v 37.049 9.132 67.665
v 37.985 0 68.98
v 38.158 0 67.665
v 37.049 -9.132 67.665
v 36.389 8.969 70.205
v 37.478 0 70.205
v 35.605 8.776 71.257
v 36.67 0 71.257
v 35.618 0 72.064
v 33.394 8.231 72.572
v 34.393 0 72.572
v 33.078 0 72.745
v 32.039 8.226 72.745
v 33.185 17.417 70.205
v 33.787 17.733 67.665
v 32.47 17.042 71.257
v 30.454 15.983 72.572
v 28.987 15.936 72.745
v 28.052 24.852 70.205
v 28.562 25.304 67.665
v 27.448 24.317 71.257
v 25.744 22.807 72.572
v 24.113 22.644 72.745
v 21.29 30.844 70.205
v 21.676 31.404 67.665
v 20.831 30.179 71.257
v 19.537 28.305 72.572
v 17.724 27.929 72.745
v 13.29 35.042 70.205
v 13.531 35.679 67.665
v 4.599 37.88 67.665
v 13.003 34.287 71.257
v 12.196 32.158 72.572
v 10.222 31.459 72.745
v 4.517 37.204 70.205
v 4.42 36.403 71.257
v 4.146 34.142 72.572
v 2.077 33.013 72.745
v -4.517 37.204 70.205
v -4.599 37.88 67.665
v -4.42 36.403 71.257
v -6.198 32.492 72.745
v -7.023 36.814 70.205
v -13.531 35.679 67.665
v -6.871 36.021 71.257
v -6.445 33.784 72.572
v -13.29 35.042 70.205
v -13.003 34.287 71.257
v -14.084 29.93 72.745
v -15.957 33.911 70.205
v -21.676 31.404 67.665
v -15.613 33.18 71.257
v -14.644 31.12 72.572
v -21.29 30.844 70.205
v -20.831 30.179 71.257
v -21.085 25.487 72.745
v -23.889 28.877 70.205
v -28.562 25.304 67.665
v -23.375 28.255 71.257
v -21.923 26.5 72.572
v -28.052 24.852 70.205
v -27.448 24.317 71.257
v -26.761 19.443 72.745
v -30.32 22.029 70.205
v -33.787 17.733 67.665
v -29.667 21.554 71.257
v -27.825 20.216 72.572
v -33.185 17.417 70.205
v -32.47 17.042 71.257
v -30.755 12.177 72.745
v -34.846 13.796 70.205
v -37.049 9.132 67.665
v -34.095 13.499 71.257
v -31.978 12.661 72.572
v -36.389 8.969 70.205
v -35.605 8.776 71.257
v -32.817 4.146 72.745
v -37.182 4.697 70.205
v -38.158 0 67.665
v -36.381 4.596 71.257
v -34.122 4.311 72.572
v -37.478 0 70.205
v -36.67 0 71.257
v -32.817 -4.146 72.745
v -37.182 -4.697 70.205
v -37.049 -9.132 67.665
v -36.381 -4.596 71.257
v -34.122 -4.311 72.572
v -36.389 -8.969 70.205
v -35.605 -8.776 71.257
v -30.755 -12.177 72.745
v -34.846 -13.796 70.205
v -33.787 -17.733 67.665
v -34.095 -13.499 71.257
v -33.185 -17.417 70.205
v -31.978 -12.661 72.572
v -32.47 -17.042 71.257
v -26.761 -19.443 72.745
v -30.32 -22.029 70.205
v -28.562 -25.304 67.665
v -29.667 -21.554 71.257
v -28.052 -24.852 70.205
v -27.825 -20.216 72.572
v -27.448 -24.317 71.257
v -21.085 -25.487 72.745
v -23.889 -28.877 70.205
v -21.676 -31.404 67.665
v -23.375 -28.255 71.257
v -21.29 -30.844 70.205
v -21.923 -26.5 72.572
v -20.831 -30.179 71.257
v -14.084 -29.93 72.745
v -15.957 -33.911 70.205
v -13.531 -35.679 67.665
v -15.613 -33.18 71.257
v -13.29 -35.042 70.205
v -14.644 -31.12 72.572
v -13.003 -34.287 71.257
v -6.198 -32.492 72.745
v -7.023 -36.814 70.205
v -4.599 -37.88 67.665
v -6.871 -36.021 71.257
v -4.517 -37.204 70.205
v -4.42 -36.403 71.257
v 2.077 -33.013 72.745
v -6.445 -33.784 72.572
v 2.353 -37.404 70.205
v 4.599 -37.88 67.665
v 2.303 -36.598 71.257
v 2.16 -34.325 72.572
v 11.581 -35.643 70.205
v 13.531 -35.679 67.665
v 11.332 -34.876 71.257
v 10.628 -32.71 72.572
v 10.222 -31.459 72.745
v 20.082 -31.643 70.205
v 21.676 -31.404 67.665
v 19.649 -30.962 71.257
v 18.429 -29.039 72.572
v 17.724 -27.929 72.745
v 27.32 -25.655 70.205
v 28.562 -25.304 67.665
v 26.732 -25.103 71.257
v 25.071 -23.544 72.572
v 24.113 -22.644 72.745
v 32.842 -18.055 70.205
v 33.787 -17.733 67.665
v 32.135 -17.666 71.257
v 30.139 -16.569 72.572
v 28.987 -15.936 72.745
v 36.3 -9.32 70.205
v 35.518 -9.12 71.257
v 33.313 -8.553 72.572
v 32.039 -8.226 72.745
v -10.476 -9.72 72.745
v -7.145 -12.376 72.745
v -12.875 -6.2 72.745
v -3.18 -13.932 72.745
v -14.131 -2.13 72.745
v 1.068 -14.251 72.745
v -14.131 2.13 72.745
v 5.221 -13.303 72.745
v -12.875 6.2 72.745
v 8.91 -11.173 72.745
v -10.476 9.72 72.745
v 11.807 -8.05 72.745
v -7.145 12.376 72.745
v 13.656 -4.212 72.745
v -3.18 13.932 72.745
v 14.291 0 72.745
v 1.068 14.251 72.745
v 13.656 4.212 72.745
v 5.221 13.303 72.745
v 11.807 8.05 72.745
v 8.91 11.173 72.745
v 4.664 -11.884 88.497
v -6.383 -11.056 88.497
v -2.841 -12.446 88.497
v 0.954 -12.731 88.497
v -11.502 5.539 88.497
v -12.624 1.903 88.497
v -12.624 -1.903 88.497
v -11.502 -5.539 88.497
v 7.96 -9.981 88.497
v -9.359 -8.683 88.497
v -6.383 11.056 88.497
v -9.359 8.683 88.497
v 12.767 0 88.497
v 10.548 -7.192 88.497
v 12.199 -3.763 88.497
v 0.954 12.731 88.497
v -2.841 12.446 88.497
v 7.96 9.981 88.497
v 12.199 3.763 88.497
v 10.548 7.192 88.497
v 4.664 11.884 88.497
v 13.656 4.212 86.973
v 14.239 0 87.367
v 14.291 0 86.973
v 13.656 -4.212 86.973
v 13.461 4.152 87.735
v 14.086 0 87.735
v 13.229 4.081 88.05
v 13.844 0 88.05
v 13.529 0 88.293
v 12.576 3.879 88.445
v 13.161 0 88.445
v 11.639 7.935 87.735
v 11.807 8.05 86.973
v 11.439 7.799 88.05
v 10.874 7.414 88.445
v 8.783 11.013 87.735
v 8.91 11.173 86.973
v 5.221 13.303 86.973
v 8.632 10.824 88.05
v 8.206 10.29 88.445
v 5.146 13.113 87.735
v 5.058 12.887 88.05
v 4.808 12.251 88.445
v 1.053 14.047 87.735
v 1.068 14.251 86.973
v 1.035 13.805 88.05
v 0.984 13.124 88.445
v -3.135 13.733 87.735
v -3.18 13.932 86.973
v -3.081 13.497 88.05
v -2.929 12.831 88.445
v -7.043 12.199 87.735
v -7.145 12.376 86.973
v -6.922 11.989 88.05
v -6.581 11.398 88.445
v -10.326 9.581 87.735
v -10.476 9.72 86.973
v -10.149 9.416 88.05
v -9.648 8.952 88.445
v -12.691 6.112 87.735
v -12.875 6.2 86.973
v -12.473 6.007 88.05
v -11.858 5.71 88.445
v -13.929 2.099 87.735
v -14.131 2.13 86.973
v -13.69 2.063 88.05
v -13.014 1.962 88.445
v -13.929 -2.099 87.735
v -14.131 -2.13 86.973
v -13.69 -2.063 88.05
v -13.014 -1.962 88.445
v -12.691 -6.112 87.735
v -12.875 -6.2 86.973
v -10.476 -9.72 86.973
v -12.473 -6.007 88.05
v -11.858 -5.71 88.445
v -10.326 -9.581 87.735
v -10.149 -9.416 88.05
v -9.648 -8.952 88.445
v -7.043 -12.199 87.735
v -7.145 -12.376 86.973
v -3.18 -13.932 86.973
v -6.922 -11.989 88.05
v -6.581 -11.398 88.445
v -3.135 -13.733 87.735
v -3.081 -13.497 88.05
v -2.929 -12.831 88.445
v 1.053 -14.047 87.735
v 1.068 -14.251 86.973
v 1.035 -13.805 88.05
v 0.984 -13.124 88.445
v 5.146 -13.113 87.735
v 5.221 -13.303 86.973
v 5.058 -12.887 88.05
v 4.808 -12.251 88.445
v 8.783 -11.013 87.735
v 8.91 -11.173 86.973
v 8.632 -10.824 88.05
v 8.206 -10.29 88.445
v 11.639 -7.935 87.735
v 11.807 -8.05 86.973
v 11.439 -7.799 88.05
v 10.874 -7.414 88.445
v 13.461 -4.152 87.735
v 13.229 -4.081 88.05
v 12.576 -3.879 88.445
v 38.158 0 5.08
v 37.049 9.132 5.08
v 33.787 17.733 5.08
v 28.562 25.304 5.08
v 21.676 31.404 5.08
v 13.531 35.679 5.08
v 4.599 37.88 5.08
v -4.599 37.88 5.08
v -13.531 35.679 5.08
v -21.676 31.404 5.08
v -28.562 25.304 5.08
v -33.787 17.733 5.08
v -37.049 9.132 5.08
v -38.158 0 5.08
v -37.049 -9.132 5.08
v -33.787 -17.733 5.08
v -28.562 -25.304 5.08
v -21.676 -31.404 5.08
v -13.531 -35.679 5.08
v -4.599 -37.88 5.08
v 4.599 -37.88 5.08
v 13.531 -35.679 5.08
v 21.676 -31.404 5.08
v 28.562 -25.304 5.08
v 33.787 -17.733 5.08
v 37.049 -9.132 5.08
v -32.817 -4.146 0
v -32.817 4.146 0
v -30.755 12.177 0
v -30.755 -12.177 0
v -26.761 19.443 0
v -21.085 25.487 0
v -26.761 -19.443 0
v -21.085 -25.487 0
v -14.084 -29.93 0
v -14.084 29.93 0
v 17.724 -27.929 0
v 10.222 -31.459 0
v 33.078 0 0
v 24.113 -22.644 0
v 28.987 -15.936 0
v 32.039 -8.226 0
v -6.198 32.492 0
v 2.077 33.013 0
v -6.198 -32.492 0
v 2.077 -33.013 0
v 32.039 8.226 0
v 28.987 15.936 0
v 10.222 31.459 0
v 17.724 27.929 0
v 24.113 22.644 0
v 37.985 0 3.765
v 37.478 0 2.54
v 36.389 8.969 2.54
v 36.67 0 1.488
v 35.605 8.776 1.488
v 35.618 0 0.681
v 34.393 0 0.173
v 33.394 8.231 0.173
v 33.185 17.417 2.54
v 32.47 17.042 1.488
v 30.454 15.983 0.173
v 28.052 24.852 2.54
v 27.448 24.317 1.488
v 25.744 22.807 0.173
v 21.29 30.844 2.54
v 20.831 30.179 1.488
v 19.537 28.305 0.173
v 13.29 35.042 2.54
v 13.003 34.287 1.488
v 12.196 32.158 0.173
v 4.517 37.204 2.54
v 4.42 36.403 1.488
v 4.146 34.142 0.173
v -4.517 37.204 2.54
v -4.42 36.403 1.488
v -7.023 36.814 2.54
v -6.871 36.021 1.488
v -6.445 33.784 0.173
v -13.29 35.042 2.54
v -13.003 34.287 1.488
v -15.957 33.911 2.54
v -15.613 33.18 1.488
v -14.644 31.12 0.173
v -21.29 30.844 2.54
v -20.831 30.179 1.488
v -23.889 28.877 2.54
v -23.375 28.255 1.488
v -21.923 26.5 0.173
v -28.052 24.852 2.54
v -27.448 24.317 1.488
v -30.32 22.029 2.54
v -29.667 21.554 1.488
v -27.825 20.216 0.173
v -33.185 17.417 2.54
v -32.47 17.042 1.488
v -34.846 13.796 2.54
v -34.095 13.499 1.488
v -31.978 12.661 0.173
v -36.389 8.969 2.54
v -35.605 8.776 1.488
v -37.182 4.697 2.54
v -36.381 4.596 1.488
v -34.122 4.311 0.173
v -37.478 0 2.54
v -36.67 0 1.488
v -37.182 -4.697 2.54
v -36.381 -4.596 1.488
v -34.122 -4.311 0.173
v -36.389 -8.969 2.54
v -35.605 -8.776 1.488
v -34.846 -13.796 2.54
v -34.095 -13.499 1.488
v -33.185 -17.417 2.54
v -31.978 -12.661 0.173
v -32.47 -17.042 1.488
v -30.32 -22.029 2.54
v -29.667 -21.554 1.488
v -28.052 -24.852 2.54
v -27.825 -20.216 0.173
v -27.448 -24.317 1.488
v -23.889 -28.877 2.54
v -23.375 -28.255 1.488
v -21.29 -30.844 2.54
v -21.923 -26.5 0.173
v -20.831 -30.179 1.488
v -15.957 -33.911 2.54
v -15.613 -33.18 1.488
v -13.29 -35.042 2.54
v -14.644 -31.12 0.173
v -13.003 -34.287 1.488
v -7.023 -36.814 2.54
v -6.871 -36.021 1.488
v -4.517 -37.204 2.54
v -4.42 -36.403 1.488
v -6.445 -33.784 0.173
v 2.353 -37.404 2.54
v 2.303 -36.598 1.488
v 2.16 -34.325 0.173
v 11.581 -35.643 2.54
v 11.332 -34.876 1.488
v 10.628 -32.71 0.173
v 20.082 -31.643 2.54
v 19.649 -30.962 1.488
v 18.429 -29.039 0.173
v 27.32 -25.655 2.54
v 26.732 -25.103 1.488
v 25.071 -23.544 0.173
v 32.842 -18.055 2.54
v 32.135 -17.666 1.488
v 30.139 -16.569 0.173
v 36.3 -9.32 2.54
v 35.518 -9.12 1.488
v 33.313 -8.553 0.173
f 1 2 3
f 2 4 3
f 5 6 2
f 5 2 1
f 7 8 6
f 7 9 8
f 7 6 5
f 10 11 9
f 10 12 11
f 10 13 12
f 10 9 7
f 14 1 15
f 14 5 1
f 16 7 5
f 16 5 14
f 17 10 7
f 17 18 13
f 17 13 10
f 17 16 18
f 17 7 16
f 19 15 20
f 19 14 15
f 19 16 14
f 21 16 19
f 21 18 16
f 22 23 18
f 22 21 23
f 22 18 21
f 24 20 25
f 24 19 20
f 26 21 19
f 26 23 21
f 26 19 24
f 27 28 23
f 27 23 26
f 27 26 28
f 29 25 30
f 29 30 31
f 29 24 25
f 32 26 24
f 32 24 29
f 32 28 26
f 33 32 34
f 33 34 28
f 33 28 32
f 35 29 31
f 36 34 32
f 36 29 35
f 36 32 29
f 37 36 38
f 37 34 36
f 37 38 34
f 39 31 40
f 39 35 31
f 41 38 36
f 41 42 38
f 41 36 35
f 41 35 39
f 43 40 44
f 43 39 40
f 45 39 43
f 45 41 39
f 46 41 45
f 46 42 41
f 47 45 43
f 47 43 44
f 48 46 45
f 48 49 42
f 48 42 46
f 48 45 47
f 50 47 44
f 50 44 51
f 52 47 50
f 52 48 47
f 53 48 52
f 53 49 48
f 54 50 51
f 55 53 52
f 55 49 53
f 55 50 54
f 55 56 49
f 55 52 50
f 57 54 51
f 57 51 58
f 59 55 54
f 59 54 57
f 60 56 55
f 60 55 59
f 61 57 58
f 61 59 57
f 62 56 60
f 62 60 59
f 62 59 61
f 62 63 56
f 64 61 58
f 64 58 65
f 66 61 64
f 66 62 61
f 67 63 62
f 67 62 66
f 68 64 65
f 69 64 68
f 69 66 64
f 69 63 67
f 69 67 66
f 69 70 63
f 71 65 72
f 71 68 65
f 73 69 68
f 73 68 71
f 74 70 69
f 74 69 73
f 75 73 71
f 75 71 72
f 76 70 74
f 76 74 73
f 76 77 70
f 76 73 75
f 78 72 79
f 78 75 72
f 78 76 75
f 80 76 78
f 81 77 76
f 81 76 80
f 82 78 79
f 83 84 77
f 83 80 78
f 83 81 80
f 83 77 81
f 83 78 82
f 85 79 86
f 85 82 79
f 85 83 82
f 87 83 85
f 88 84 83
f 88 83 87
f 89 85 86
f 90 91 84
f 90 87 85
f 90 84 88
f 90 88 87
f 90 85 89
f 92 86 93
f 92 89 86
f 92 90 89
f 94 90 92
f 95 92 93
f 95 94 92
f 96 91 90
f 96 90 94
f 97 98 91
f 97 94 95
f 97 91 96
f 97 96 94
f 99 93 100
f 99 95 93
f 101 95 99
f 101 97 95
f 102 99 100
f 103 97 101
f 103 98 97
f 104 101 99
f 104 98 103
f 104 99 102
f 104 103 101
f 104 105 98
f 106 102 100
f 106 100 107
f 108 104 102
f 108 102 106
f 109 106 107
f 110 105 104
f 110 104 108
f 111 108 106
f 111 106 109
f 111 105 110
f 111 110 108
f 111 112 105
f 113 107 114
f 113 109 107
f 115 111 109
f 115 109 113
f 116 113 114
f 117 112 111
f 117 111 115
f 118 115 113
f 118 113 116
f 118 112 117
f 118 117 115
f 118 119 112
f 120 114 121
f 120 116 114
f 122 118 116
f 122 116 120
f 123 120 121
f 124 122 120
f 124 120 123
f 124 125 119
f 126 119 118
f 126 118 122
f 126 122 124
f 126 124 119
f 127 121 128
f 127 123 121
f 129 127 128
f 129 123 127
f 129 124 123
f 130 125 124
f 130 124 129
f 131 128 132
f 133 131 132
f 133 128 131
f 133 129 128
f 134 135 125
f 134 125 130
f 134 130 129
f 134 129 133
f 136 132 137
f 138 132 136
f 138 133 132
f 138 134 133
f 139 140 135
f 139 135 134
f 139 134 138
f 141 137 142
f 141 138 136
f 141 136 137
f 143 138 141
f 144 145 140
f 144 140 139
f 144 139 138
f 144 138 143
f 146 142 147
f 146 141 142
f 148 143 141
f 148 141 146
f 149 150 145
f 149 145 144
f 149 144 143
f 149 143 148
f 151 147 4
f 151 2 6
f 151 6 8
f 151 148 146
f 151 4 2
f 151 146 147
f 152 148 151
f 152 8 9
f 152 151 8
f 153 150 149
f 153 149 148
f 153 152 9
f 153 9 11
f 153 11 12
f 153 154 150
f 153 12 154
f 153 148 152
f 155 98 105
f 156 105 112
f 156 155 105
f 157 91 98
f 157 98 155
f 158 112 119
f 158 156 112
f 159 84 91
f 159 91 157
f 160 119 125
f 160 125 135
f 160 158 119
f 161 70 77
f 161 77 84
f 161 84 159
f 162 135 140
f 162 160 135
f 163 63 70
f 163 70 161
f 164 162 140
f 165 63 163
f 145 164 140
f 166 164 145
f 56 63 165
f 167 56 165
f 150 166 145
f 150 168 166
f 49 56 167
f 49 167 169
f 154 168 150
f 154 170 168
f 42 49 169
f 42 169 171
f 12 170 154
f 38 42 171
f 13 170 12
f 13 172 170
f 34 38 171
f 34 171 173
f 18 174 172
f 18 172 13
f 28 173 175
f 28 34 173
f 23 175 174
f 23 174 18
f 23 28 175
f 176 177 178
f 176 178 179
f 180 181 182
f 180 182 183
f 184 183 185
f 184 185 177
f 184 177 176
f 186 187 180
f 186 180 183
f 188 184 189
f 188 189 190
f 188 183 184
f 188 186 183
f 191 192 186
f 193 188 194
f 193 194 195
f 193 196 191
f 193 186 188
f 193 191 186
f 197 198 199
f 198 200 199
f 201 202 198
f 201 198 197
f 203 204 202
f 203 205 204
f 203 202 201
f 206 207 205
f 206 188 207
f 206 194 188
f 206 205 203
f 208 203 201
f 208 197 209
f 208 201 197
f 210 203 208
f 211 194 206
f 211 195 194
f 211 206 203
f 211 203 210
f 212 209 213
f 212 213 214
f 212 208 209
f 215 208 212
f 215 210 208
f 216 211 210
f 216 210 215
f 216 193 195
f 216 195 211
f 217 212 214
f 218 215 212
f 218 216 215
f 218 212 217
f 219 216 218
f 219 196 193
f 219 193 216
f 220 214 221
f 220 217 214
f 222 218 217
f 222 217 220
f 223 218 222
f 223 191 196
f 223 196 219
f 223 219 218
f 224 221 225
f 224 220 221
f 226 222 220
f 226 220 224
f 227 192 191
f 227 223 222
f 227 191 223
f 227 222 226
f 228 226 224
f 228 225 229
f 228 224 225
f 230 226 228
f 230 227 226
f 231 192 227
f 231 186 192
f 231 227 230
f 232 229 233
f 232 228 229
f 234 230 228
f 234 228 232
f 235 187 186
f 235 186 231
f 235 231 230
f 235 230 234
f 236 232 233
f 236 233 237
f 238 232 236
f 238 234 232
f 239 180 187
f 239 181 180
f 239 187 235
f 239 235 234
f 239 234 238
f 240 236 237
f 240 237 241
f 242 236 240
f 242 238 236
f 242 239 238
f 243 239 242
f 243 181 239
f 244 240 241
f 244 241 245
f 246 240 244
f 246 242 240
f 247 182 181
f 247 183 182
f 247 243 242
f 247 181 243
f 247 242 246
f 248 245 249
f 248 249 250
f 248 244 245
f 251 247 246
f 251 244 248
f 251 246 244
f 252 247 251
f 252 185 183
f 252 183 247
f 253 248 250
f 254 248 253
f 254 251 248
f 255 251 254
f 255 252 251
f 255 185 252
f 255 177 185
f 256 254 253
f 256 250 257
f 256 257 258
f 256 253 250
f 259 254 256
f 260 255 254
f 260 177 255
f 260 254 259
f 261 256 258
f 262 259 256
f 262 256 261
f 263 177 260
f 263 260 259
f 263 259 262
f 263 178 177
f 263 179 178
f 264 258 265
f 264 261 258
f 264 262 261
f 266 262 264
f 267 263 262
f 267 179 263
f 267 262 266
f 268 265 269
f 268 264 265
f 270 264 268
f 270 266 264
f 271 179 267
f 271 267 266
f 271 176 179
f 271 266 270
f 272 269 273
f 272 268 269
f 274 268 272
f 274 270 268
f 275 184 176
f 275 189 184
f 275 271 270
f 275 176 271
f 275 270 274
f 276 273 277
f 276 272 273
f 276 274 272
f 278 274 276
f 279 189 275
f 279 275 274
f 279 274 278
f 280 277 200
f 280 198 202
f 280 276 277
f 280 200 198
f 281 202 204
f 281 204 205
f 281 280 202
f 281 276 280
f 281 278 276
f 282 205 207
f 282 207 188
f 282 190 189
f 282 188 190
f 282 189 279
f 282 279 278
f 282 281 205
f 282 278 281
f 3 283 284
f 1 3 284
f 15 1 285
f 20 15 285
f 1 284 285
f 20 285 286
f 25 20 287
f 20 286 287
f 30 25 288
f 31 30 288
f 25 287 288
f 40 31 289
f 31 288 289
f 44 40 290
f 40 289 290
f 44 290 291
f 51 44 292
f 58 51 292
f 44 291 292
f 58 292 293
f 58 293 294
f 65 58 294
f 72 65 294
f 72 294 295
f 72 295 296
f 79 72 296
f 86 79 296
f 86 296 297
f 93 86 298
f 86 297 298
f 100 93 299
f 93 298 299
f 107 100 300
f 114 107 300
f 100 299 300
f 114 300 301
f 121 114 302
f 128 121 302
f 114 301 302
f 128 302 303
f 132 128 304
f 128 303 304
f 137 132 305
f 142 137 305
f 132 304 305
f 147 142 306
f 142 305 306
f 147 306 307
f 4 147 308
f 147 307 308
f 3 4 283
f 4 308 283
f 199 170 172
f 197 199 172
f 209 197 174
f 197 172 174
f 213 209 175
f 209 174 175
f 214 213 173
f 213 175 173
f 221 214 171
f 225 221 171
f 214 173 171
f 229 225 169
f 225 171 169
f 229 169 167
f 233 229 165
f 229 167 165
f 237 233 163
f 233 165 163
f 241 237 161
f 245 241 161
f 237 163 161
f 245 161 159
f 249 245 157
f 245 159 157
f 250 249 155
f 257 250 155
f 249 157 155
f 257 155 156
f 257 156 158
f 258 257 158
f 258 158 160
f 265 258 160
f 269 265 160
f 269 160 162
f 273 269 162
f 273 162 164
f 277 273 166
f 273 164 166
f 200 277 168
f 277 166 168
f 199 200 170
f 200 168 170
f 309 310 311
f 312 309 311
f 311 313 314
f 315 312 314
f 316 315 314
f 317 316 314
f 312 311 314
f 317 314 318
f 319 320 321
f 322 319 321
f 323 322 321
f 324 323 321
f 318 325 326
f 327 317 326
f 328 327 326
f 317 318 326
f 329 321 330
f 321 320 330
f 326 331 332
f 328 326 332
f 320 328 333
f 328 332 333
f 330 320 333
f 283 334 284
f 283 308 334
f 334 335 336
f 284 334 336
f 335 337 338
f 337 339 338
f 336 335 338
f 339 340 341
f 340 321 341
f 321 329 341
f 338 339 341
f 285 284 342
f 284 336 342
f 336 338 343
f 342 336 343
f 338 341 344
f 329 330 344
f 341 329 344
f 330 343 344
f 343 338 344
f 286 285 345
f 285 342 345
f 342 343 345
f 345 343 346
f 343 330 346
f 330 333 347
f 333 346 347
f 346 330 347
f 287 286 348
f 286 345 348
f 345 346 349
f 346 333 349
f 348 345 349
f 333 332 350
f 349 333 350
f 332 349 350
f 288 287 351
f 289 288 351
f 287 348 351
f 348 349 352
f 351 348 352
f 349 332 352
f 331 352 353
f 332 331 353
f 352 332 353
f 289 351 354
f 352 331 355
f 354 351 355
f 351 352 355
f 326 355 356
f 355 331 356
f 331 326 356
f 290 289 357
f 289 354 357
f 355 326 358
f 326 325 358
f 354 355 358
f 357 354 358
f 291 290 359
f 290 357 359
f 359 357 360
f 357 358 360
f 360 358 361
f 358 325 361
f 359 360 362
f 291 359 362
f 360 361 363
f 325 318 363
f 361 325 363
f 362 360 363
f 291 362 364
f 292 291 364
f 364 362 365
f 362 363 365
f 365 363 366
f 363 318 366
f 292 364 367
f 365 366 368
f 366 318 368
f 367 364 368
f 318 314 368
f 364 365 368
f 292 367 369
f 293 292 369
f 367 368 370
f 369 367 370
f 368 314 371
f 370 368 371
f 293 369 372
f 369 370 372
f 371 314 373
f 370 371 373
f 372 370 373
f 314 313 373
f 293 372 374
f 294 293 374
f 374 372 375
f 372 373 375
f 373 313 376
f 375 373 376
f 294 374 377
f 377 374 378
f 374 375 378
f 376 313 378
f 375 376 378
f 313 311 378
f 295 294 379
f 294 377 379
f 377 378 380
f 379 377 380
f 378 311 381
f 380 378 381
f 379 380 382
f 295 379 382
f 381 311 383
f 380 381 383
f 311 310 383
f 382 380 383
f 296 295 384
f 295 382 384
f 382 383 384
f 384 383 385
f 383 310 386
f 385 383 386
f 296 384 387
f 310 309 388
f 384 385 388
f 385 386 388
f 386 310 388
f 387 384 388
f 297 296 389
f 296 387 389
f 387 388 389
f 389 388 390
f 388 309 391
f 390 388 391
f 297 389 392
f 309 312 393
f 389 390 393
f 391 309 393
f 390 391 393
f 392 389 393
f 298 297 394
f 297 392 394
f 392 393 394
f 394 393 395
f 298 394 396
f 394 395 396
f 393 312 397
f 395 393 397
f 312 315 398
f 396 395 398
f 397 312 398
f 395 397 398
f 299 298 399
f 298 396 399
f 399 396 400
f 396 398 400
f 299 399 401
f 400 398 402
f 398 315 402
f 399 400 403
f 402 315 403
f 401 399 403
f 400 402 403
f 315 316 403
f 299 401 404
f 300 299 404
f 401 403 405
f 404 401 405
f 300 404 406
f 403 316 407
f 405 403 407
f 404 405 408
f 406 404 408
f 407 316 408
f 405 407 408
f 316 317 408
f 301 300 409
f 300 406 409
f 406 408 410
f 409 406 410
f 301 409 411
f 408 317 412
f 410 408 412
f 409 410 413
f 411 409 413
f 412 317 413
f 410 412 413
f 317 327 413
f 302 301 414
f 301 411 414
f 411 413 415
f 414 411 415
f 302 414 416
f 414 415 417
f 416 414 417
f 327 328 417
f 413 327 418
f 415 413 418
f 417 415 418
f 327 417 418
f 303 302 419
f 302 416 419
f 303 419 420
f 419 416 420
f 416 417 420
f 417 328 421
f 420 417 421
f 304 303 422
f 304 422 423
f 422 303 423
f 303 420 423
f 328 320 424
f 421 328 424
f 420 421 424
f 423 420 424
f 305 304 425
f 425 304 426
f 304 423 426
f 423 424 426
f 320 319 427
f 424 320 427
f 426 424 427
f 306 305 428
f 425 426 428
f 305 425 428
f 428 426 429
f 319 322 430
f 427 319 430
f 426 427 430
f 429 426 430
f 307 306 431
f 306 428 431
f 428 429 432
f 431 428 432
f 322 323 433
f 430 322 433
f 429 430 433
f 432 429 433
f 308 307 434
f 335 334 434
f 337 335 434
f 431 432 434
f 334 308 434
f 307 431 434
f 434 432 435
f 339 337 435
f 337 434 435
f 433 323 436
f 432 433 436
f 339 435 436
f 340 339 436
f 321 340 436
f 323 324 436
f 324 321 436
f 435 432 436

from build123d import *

# Parameters (mm, degrees)
F0_R     = 38.158283
F1_DEPTH = 72.74499
F2_R     = 5.08
F3_R     = 14.290577
F4_DEPTH = 15.7517
F5_R     = 1.524


with BuildPart() as f1:
    # F0 (on Top) → F1 (new body)
    with BuildSketch(Plane.XY):
        Circle(F0_R)
    extrude(amount=F1_DEPTH)

    # F2
    f2_edges = [f1.edges().sort_by_distance(p)[0] for p in [
        (-38.158283, 0, 72.74499),
        (-38.158283, 0, 0),
    ]]
    fillet(f2_edges, radius=F2_R)

    # F3 (on face) → F4 (join)
    with BuildSketch(Plane.XY.offset(72.74499)):
        Circle(F3_R)
    extrude(amount=F4_DEPTH)

    # F5
    f5_edges = [f1.edges().sort_by_distance(p)[0] for p in [
        (-14.290577, 0, 88.49669),
    ]]
    fillet(f5_edges, radius=F5_R)


solid = f1.part
